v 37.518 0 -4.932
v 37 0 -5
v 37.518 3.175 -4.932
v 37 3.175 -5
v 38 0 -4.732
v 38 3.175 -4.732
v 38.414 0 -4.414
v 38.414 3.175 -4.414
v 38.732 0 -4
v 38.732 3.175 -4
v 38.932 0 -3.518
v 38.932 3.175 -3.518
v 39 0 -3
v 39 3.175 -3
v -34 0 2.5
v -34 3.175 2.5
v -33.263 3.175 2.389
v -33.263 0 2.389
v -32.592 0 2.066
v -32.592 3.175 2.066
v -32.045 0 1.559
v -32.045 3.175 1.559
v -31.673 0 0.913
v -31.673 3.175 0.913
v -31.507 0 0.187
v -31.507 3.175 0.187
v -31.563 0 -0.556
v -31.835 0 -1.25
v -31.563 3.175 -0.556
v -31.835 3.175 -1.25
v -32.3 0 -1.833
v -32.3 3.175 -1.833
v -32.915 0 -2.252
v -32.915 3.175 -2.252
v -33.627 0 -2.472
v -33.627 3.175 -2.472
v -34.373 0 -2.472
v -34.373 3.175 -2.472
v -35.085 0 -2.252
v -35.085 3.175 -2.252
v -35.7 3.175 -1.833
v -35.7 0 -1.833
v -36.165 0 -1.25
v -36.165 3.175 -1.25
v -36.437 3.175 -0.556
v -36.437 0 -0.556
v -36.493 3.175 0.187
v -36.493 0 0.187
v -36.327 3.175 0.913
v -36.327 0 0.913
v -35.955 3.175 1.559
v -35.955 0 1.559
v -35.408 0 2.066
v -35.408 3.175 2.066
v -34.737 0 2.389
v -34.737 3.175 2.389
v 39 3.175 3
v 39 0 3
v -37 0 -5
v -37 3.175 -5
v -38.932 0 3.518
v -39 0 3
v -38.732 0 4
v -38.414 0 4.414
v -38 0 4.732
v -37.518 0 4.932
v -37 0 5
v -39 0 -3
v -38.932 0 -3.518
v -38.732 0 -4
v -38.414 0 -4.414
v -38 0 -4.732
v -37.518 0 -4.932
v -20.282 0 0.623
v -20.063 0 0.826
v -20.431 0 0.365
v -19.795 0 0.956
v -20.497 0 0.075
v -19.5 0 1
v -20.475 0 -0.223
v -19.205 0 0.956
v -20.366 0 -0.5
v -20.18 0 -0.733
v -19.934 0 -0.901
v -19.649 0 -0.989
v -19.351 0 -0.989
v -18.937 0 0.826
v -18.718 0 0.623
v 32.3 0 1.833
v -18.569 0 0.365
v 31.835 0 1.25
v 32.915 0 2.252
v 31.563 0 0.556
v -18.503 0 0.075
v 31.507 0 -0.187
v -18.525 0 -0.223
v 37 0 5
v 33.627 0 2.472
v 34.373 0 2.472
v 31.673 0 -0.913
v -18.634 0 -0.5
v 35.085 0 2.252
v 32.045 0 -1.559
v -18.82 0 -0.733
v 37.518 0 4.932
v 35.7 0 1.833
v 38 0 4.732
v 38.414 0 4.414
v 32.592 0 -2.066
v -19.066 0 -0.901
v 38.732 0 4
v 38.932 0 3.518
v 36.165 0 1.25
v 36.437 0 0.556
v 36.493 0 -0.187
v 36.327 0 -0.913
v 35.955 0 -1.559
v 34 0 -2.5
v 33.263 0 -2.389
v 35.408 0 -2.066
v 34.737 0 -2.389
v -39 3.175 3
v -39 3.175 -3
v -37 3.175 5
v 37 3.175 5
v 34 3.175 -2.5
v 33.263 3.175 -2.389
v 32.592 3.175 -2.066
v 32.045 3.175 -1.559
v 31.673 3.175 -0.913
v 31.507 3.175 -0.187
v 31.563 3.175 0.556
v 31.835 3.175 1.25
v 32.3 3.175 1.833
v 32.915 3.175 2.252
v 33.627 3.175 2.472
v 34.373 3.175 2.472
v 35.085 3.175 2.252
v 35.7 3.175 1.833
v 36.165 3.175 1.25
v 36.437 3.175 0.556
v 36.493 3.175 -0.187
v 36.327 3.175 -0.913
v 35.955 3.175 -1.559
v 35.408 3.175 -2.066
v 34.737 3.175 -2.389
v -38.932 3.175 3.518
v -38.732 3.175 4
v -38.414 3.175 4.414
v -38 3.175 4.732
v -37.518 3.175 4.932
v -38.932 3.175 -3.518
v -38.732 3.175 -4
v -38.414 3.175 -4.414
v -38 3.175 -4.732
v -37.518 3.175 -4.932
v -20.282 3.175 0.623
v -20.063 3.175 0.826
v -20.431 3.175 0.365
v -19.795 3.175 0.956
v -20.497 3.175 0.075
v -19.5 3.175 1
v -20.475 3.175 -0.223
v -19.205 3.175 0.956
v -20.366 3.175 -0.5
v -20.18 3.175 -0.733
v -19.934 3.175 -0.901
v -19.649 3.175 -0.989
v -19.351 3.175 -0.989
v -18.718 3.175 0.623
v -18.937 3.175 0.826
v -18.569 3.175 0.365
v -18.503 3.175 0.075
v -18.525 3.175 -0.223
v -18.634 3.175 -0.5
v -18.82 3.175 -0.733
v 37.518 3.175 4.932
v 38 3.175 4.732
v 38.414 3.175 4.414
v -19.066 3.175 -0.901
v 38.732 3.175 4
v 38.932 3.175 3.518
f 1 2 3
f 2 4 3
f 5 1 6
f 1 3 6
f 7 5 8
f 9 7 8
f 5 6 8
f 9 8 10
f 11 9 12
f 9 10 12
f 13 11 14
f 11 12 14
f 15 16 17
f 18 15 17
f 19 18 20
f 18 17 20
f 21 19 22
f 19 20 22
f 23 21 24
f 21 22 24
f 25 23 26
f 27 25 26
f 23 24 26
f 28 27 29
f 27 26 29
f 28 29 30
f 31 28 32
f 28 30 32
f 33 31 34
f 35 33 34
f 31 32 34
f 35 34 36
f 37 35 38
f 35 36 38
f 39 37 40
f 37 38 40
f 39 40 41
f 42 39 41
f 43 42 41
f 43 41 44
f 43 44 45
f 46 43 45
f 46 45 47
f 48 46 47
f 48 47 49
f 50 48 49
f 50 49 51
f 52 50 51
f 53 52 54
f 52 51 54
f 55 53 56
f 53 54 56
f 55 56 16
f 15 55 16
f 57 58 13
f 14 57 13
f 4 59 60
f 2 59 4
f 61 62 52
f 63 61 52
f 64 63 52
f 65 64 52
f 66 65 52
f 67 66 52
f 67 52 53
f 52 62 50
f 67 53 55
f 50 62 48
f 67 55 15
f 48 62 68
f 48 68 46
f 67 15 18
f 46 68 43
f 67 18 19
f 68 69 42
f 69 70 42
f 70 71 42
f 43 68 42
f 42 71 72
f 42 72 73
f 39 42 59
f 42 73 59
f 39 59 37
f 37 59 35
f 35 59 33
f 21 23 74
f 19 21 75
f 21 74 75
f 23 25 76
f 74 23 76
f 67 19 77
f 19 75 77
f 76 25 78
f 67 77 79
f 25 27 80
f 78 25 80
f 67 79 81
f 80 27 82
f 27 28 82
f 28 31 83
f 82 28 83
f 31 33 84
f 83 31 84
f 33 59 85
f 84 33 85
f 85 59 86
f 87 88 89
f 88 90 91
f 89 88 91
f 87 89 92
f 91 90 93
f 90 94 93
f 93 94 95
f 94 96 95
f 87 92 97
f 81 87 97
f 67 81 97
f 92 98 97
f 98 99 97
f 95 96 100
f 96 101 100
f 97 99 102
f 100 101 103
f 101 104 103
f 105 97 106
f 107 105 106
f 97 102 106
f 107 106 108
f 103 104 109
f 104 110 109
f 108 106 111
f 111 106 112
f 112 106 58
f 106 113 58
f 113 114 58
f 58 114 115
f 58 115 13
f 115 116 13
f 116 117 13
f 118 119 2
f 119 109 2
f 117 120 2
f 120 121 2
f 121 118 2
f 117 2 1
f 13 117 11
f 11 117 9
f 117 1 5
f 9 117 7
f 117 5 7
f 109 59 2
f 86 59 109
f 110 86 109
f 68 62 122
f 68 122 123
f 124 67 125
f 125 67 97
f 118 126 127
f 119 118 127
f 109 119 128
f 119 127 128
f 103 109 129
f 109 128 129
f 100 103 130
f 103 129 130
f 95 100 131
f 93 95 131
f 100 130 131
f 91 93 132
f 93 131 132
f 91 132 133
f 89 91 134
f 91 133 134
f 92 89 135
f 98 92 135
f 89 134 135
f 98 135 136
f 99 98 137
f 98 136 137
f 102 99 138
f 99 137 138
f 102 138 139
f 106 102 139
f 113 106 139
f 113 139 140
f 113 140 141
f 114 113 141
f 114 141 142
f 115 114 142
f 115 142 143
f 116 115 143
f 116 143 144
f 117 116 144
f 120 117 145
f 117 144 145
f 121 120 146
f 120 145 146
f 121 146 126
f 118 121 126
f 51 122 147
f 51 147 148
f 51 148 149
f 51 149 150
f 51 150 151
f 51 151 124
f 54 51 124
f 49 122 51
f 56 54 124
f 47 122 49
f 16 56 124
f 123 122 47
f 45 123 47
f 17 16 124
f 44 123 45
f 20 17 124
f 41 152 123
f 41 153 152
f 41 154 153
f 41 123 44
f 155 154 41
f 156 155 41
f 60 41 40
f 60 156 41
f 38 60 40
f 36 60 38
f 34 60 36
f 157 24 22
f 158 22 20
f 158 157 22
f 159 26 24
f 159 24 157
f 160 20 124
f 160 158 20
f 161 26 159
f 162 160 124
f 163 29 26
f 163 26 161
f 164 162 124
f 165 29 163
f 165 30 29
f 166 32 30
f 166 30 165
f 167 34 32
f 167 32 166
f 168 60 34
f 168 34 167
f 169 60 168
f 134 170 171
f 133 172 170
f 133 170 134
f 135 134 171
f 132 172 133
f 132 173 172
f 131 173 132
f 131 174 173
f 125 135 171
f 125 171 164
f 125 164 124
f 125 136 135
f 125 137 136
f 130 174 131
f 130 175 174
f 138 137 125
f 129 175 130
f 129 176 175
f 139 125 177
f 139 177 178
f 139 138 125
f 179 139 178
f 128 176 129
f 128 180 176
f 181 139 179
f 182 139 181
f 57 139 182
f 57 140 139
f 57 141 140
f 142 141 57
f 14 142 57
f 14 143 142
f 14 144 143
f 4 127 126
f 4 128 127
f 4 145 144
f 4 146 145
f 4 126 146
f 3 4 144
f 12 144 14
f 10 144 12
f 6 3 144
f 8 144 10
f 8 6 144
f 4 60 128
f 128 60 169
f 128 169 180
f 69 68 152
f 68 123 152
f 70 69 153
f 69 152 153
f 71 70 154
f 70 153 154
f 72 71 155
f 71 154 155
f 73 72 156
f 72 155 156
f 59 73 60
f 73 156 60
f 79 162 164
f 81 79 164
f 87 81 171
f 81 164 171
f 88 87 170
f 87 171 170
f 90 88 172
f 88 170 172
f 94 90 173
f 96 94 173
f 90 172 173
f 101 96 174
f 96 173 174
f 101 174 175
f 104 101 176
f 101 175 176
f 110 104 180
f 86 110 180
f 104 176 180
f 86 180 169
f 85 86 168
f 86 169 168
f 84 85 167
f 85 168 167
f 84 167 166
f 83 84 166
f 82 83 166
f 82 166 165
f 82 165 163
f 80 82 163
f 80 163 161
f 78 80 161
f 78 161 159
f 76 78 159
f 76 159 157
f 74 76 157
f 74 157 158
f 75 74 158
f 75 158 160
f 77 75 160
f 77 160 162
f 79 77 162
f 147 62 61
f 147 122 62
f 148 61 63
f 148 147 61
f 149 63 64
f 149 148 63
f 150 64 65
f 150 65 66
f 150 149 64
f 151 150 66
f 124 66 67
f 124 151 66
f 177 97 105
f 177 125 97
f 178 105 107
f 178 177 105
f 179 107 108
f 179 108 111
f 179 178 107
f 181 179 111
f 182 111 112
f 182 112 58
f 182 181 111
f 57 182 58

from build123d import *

# Parameters (mm, degrees)
SKETCH2_W           = 78
SKETCH2_H           = 10
BOSS_EXTRUDE1_DEPTH = 3.175
SKETCH3_R           = 2.5
CUT_EXTRUDE1_DEPTH  = 3.175
CUT_EXTRUDE2_REACH  = 41.447
SKETCH4_R           = 1
FILLET1_R           = 2


with BuildPart() as part:
    # Sketch2 → Boss-Extrude1 (new body)
    with BuildSketch(Plane(origin=(0, 0, 0), x_dir=(1, 0, 0), z_dir=(0, 1, 0))):
        Rectangle(SKETCH2_W, SKETCH2_H)
    extrude(amount=BOSS_EXTRUDE1_DEPTH)

    # Sketch3 → Cut-Extrude1 (cut)
    with BuildSketch(Plane(origin=(0, 3.175, 0), x_dir=(1, 0, 0), z_dir=(0, 1, 0))):
        with Locations(Location((-34, 0, 0), (0, 0, 270))):
            Circle(SKETCH3_R)
        with Locations(Location((34, 0, 0), (0, 0, 90))):
            Circle(SKETCH3_R)
    extrude(amount=-CUT_EXTRUDE1_DEPTH, mode=Mode.SUBTRACT)

    # Sketch4 → Cut-Extrude2 (cut, up to next)
    with BuildSketch(Plane(origin=(0, 3.175, 0), x_dir=(1, 0, 0), z_dir=(0, 1, 0)), mode=Mode.PRIVATE) as cut_extrude2_sk1:
        with Locations(Location((-19.5, 0, 0), (0, 0, 270))):
            Circle(SKETCH4_R)
    cut_extrude2_tool1 = extrude(cut_extrude2_sk1.sketch, amount=-CUT_EXTRUDE2_REACH, mode=Mode.PRIVATE) & part.part
    add(cut_extrude2_tool1.solids().sort_by_distance((-19.5, 3.175, 0))[0], mode=Mode.SUBTRACT)

    # Fillet1
    fillet1_edges = [part.edges().sort_by_distance(p)[0] for p in [
        (39, 1.5875, 5),
        (-39, 1.5875, 5),
        (-39, 1.5875, -5),
        (39, 1.5875, -5),
    ]]
    fillet(fillet1_edges, radius=FILLET1_R)


solid = part.part
